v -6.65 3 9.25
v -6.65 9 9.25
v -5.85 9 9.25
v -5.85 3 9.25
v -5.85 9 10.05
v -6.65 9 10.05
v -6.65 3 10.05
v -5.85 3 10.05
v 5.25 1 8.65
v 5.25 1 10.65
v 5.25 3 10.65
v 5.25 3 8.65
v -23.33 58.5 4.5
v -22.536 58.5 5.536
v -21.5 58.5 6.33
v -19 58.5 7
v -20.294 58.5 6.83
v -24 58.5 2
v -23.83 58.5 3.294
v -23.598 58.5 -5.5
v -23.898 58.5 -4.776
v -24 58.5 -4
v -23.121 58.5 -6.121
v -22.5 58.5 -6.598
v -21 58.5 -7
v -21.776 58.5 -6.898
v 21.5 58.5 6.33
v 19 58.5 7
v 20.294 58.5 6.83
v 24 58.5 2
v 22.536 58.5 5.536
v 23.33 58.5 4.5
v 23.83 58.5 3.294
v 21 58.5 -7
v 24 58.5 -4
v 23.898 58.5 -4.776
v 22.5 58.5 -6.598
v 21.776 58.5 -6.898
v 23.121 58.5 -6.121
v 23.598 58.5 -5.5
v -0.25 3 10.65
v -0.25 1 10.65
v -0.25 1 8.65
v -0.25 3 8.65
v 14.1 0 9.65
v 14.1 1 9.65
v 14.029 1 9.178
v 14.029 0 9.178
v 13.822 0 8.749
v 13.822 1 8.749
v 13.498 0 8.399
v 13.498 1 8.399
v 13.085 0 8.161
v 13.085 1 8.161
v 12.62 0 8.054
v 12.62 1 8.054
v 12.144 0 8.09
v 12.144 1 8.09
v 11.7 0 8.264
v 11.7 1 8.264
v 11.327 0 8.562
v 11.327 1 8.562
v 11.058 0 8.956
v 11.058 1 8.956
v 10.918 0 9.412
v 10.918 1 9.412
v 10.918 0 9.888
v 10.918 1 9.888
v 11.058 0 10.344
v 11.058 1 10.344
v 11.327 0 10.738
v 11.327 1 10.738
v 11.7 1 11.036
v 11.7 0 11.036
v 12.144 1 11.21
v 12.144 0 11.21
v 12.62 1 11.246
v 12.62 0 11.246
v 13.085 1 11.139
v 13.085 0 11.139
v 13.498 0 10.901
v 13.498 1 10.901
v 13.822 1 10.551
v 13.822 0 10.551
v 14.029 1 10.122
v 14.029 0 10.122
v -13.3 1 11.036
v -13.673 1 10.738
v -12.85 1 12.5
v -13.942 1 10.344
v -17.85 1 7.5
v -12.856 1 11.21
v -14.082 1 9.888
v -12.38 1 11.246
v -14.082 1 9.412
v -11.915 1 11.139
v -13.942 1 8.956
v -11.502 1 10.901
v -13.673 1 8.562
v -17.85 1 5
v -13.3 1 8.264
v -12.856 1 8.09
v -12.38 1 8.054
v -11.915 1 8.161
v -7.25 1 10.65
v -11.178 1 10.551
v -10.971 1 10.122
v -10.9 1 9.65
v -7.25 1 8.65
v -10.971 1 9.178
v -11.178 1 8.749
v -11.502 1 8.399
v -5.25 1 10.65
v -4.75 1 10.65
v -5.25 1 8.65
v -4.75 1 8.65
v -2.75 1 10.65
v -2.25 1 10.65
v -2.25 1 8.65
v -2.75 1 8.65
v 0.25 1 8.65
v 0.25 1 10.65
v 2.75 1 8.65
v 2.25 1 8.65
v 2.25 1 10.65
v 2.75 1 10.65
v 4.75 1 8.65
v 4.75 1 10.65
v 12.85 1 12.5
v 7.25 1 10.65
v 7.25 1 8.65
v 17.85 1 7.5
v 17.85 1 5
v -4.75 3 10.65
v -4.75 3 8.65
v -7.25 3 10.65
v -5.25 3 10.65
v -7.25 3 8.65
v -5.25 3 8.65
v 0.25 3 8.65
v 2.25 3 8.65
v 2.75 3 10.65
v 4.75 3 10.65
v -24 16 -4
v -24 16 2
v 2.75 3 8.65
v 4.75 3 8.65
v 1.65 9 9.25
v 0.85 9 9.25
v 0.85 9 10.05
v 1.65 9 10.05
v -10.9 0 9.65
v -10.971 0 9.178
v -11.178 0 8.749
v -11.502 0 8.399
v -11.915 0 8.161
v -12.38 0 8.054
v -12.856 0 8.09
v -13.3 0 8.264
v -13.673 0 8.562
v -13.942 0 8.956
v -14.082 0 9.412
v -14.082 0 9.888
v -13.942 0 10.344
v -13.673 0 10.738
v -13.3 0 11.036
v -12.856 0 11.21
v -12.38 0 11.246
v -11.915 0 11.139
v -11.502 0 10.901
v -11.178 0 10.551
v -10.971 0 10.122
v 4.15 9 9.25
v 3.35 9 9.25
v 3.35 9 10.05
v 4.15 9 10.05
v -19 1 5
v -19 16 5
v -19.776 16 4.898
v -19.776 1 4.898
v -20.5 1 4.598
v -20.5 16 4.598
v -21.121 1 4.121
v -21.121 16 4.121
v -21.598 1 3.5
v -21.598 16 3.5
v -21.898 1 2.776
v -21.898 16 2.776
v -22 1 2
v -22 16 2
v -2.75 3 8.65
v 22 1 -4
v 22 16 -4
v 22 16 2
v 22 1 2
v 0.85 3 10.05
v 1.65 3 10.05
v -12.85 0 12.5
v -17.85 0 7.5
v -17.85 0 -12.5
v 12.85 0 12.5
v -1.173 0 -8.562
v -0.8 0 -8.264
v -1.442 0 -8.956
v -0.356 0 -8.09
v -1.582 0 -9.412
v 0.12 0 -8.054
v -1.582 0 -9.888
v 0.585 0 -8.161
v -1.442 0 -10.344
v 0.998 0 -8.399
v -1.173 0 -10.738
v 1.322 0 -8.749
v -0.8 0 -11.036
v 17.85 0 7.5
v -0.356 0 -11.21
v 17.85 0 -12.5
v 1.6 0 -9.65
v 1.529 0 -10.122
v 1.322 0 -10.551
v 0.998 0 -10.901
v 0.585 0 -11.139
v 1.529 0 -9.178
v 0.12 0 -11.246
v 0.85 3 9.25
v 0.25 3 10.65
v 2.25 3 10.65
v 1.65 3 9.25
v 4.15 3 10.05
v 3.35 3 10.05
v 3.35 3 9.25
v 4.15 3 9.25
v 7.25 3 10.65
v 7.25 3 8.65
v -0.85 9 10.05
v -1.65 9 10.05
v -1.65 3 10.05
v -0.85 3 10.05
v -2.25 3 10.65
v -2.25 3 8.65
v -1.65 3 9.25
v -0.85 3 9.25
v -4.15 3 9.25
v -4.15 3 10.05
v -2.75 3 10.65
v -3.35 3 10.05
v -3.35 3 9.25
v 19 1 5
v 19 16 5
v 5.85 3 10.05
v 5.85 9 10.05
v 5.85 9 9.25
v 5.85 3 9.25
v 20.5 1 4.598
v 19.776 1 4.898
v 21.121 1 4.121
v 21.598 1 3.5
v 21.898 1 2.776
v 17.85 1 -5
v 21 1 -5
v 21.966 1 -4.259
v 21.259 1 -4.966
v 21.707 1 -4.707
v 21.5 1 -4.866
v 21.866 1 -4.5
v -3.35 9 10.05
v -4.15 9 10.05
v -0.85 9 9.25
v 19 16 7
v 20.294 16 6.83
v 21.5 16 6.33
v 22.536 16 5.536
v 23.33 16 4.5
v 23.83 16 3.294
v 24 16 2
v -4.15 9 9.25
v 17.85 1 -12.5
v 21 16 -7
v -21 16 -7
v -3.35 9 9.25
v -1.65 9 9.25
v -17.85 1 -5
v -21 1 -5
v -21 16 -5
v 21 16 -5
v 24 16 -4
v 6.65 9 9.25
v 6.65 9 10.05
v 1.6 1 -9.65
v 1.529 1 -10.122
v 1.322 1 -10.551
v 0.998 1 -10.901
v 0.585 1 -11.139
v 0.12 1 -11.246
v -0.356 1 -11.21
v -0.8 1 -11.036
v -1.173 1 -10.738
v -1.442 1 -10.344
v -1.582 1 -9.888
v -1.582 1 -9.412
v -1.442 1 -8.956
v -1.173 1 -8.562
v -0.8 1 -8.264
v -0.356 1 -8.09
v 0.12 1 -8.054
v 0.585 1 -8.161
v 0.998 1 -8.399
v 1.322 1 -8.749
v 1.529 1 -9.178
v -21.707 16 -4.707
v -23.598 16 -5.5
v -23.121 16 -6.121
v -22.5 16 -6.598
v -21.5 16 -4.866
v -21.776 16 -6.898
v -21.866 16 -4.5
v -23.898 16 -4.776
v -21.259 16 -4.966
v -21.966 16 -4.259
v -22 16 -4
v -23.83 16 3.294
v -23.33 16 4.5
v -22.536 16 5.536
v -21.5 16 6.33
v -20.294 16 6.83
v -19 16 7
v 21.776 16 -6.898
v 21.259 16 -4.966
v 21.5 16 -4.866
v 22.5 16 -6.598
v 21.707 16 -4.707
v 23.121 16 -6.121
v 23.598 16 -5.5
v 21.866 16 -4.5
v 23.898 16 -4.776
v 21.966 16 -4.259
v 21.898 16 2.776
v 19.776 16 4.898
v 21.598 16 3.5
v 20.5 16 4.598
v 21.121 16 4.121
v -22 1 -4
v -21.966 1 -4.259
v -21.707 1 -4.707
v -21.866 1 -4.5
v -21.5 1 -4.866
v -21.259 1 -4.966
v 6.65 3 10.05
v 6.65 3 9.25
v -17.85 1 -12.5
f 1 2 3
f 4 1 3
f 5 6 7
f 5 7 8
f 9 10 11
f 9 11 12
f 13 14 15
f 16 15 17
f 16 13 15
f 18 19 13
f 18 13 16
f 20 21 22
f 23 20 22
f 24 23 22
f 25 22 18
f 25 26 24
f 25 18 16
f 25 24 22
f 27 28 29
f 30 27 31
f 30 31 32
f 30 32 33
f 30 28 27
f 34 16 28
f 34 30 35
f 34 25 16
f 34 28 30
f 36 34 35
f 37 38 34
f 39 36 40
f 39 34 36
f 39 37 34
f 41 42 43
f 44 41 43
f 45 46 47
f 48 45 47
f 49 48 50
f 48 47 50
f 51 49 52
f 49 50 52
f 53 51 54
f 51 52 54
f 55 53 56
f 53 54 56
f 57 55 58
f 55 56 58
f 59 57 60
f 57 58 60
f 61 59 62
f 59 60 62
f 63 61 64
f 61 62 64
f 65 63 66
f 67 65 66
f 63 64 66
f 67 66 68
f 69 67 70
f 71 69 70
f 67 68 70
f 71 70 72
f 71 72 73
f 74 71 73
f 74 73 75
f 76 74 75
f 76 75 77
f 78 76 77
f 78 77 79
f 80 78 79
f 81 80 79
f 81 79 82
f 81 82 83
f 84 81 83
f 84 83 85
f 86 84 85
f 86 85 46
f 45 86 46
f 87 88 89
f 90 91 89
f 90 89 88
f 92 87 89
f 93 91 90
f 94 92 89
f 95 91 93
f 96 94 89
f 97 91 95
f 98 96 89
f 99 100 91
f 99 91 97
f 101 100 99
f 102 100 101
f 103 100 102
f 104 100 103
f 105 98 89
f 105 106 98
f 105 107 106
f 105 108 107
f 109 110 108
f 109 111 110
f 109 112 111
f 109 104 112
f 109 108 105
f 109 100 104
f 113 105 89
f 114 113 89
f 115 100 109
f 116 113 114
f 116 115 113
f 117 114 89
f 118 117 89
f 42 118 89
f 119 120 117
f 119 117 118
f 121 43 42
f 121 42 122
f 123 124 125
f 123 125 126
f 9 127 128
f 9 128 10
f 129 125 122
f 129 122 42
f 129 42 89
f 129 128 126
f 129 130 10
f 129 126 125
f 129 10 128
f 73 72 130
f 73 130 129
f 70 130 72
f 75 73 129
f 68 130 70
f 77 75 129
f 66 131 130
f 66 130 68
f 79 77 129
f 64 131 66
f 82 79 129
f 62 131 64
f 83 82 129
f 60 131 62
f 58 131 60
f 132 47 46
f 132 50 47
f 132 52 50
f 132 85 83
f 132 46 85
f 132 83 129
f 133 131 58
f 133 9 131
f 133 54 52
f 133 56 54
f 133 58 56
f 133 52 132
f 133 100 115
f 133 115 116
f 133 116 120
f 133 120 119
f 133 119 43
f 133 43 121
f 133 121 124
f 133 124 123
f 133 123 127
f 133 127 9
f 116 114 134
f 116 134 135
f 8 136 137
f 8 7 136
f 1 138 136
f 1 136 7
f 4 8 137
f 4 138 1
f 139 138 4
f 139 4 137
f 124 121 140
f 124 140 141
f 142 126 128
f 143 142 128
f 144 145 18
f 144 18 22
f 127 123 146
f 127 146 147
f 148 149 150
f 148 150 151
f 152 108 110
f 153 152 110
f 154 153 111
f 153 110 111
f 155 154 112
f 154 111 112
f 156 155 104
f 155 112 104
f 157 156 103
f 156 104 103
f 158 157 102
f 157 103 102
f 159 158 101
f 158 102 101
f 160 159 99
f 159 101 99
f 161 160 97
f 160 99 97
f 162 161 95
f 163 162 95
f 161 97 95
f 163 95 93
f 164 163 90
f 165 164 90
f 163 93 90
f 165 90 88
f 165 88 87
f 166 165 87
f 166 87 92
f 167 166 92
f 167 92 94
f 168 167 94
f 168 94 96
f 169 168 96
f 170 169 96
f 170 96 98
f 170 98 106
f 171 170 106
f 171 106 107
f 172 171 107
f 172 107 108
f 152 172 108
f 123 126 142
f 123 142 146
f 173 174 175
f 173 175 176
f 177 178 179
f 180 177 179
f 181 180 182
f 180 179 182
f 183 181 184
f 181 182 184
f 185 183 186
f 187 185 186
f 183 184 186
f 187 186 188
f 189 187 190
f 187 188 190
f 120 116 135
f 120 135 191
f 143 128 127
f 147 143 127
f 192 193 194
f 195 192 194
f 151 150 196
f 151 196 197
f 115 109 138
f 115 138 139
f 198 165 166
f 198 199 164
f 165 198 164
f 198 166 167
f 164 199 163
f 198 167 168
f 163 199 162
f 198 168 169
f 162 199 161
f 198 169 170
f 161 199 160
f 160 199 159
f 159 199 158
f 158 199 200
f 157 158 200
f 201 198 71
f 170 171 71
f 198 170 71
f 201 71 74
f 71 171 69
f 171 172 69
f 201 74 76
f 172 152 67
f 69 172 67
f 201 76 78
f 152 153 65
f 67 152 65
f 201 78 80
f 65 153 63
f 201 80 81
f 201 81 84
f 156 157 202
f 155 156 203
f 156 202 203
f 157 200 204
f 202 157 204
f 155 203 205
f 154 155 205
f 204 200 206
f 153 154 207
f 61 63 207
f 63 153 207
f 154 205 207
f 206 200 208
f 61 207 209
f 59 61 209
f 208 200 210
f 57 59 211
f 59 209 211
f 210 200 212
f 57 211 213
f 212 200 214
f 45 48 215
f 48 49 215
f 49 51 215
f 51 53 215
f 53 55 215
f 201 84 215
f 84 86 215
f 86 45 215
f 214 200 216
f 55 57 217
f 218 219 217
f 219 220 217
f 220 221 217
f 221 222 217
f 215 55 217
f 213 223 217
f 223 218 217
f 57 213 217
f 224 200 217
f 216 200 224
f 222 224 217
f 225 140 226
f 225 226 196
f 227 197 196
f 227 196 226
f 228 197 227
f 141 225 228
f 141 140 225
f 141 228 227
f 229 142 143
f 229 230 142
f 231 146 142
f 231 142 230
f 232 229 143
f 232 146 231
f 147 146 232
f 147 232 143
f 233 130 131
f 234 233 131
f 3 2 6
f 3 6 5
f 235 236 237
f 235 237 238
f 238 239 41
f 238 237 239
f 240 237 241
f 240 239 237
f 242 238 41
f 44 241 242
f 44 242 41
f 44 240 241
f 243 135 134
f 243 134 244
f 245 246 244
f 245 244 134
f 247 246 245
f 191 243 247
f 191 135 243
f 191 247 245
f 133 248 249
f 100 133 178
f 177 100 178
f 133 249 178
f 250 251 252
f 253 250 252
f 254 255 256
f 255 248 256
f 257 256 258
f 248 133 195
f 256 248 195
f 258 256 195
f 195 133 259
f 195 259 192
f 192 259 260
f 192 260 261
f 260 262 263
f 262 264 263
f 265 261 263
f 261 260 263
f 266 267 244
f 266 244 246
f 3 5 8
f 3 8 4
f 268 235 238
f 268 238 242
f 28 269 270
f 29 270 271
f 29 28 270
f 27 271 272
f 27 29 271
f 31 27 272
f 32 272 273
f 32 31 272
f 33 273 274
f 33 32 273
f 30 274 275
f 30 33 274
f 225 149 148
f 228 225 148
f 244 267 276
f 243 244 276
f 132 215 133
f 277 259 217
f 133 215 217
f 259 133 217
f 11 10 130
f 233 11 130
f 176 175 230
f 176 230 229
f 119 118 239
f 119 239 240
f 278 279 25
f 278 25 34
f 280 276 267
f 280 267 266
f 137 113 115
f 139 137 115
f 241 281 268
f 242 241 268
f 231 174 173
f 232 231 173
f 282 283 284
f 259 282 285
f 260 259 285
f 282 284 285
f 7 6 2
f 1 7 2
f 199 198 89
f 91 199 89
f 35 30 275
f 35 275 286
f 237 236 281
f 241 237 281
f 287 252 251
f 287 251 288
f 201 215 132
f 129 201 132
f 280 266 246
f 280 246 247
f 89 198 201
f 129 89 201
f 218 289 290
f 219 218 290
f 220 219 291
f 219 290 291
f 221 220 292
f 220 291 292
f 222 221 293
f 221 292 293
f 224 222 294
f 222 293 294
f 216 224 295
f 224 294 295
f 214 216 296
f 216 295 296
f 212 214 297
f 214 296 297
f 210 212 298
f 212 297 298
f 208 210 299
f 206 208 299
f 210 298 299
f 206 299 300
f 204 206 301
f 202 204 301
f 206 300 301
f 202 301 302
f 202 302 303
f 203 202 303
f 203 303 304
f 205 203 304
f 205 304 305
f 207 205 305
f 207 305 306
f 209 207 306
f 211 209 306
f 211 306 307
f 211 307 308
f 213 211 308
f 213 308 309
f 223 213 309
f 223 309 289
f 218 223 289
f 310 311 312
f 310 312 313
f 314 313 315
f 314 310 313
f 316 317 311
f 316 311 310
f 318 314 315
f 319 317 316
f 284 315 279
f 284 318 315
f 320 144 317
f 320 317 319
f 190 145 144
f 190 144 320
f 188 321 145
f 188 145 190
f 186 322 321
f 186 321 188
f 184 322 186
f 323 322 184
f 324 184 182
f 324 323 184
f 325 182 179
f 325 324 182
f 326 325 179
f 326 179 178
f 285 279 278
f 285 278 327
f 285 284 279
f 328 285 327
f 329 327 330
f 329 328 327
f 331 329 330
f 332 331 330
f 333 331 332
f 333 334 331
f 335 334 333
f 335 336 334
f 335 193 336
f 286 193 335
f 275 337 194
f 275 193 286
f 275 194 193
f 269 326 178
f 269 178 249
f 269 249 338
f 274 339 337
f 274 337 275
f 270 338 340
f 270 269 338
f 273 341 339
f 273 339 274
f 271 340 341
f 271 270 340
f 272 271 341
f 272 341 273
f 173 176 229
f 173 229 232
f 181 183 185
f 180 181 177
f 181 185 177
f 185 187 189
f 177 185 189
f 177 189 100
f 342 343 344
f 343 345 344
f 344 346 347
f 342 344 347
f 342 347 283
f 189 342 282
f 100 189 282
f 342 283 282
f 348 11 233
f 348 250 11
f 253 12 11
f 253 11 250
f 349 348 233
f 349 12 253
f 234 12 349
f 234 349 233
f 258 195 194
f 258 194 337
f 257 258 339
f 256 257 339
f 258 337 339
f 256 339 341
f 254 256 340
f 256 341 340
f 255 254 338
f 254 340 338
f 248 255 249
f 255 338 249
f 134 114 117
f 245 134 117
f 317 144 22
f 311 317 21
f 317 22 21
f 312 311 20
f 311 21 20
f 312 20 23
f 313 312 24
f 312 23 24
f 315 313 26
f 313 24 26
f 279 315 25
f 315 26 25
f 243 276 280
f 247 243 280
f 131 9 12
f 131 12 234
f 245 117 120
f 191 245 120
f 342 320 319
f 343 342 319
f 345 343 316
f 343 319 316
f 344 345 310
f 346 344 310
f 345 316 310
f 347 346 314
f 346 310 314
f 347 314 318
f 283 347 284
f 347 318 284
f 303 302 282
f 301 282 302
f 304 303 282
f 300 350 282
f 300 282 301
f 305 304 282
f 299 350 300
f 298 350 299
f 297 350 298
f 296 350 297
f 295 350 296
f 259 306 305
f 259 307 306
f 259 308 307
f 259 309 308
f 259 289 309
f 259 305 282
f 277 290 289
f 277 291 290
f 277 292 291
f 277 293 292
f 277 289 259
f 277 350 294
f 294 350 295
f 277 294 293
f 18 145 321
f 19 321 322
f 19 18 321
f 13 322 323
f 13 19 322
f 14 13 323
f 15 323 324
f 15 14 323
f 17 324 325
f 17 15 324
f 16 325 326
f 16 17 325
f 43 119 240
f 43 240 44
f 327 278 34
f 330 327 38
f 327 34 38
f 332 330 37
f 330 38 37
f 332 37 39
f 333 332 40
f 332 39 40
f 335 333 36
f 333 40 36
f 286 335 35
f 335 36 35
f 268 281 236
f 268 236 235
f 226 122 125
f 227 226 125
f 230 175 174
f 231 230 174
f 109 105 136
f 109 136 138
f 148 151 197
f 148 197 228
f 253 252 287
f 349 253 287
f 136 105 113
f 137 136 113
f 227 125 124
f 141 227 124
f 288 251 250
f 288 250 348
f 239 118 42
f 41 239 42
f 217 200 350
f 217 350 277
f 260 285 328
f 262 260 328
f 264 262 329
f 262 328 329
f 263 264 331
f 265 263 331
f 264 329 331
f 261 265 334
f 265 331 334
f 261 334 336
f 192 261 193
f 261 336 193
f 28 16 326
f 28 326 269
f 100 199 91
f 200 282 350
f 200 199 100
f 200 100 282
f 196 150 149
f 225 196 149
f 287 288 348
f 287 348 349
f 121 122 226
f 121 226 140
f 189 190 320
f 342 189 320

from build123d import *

# Parameters (mm, degrees)
SKETCH_1_W          = 35.7
SKETCH_1_H          = 25
EXTRUDE_1_DEPTH     = 1
SKETCH_2_W          = 48
SKETCH_2_H          = 14
EXTRUDE_2_DEPTH     = 57.5
FILLET_1_R          = 3
FILLET_2_R          = 5
CHAMFER_1_SIZE      = 5
HOLE_WIZARD_M3_1_D  = 3.2
CUT_EXTRUDE_START   = -15
CUT_EXTRUDE_1_DEPTH = 15
SKETCH_6_W          = 2
SKETCH_6_H          = 2
EXTRUDE_3_DEPTH     = 8
SKETCH_7_W          = 2
SKETCH_7_H          = 2
SKETCH_7_W_2        = 0.8
SKETCH_7_H_2        = 0.8
CUT_EXTRUDE_2_DEPTH = 6


with BuildPart() as part:
    # 草图1 → 凸台-拉伸1 (new body)
    with BuildSketch(Plane(origin=(0, 0, 0), x_dir=(1, 0, 0), z_dir=(0, 1, 0))):
        Rectangle(SKETCH_1_W, SKETCH_1_H)
    extrude(amount=EXTRUDE_1_DEPTH)

    # 草图2 → 凸台-拉伸2 (add)
    with BuildSketch(Plane(origin=(0, 1, 0), x_dir=(1, 0, 0), z_dir=(0, 1, 0))):
        Rectangle(SKETCH_2_W, SKETCH_2_H)
    extrude(amount=EXTRUDE_2_DEPTH)

    # 圆角1
    fillet_1_edges = [part.edges().sort_by_distance(p)[0] for p in [
        (-24, 29.75, -7),
        (24, 29.75, -7),
    ]]
    fillet(fillet_1_edges, radius=FILLET_1_R)

    # 圆角2
    fillet_2_edges = [part.edges().sort_by_distance(p)[0] for p in [
        (-24, 29.75, 7),
        (24, 29.75, 7),
    ]]
    fillet(fillet_2_edges, radius=FILLET_2_R)

    # 倒角1
    chamfer_1_edges = [part.edges().sort_by_distance(p)[0] for p in [
        (17.85, 0.5, 12.5),
        (-17.85, 0.5, 12.5),
    ]]
    chamfer(chamfer_1_edges, length=CHAMFER_1_SIZE)

    # M3 间隙孔1 (through all)
    with Locations(Plane(origin=(0, 0, 0), x_dir=(-1, 0, 0), z_dir=(0, -1, 0))):
        with Locations((0, 9.65), (-12.5, -9.65), (12.5, -9.65)):
            Hole(HOLE_WIZARD_M3_1_D / 2)

    # 草图5 → 切除-拉伸1 (cut)
    with BuildSketch(Plane.XZ.offset(-1).offset(CUT_EXTRUDE_START)):
        with BuildLine():
            Line((-24, 2), (-24, -4))
            ThreePointArc((-24, -4), (-23.121320344, -6.121320344), (-21, -7))
            Line((-21, -7), (21, -7))
            ThreePointArc((21, -7), (23.121320344, -6.121320344), (24, -4))
            Line((24, -4), (24, 2))
            ThreePointArc((24, 2), (22.535533906, 5.535533906), (19, 7))
            Line((19, 7), (-19, 7))
            ThreePointArc((-19, 7), (-22.535533906, 5.535533906), (-24, 2))
        make_face()
        with BuildLine():
            Line((-22, 2), (-22, -4))
            ThreePointArc((-22, -4), (-21.707106781, -4.707106781), (-21, -5))
            Line((-21, -5), (21, -5))
            ThreePointArc((21, -5), (21.707106781, -4.707106781), (22, -4))
            Line((22, -4), (22, 2))
            ThreePointArc((22, 2), (21.121320344, 4.121320344), (19, 5))
            Line((19, 5), (-19, 5))
            ThreePointArc((-19, 5), (-21.121320344, 4.121320344), (-22, 2))
        make_face(mode=Mode.SUBTRACT)
    extrude(amount=CUT_EXTRUDE_1_DEPTH, mode=Mode.SUBTRACT)

    # 草图6 → 凸台-拉伸3 (add)
    with BuildSketch(Plane(origin=(0, 1, 0), x_dir=(1, 0, 0), z_dir=(0, 1, 0))):
        with Locations((1.25, -9.65)):
            Rectangle(SKETCH_6_W, SKETCH_6_H)
        with Locations((-1.25, -9.65)):
            Rectangle(SKETCH_6_W, SKETCH_6_H)
        with Locations((-3.75, -9.65)):
            Rectangle(SKETCH_6_W, SKETCH_6_H)
        with Locations((-6.25, -9.65)):
            Rectangle(SKETCH_6_W, SKETCH_6_H)
        with Locations((6.25, -9.65)):
            Rectangle(SKETCH_6_W, SKETCH_6_H)
        with Locations((3.75, -9.65)):
            Rectangle(SKETCH_6_W, SKETCH_6_H)
    extrude(amount=EXTRUDE_3_DEPTH)

    # 草图7 → 切除-拉伸2 (cut)
    # profile 1 of 6: a face of its own
    with BuildSketch(Plane(origin=(0, 9, 0), x_dir=(1, 0, 0), z_dir=(0, 1, 0))):
        with Locations((-6.25, -9.65)):
            Rectangle(SKETCH_7_W, SKETCH_7_H)
        with Locations((-6.25, -9.65)):
            Rectangle(SKETCH_7_W_2, SKETCH_7_H_2, mode=Mode.SUBTRACT)
    # profile 2 of 6: a face of its own
    with BuildSketch(Plane(origin=(0, 9, 0), x_dir=(1, 0, 0), z_dir=(0, 1, 0))):
        with Locations((6.25, -9.65)):
            Rectangle(SKETCH_7_W, SKETCH_7_H)
        with Locations((6.25, -9.65)):
            Rectangle(SKETCH_7_W_2, SKETCH_7_H_2, mode=Mode.SUBTRACT)
    # profile 3 of 6: a face of its own
    with BuildSketch(Plane(origin=(0, 9, 0), x_dir=(1, 0, 0), z_dir=(0, 1, 0))):
        with Locations((3.75, -9.65)):
            Rectangle(SKETCH_7_W, SKETCH_7_H)
        with Locations((3.75, -9.65)):
            Rectangle(SKETCH_7_W_2, SKETCH_7_H_2, mode=Mode.SUBTRACT)
    # profile 4 of 6: a face of its own
    with BuildSketch(Plane(origin=(0, 9, 0), x_dir=(1, 0, 0), z_dir=(0, 1, 0))):
        with Locations((1.25, -9.65)):
            Rectangle(SKETCH_7_W, SKETCH_7_H)
        with Locations((1.25, -9.65)):
            Rectangle(SKETCH_7_W_2, SKETCH_7_H_2, mode=Mode.SUBTRACT)
    # profile 5 of 6: a face of its own
    with BuildSketch(Plane(origin=(0, 9, 0), x_dir=(1, 0, 0), z_dir=(0, 1, 0))):
        with Locations((-1.25, -9.65)):
            Rectangle(SKETCH_7_W, SKETCH_7_H)
        with Locations((-1.25, -9.65)):
            Rectangle(SKETCH_7_W_2, SKETCH_7_H_2, mode=Mode.SUBTRACT)
    # profile 6 of 6: a face of its own
    with BuildSketch(Plane(origin=(0, 9, 0), x_dir=(1, 0, 0), z_dir=(0, 1, 0))):
        with Locations((-3.75, -9.65)):
            Rectangle(SKETCH_7_W, SKETCH_7_H)
        with Locations((-3.75, -9.65)):
            Rectangle(SKETCH_7_W_2, SKETCH_7_H_2, mode=Mode.SUBTRACT)
    extrude(amount=-CUT_EXTRUDE_2_DEPTH, mode=Mode.SUBTRACT)


solid = part.part
